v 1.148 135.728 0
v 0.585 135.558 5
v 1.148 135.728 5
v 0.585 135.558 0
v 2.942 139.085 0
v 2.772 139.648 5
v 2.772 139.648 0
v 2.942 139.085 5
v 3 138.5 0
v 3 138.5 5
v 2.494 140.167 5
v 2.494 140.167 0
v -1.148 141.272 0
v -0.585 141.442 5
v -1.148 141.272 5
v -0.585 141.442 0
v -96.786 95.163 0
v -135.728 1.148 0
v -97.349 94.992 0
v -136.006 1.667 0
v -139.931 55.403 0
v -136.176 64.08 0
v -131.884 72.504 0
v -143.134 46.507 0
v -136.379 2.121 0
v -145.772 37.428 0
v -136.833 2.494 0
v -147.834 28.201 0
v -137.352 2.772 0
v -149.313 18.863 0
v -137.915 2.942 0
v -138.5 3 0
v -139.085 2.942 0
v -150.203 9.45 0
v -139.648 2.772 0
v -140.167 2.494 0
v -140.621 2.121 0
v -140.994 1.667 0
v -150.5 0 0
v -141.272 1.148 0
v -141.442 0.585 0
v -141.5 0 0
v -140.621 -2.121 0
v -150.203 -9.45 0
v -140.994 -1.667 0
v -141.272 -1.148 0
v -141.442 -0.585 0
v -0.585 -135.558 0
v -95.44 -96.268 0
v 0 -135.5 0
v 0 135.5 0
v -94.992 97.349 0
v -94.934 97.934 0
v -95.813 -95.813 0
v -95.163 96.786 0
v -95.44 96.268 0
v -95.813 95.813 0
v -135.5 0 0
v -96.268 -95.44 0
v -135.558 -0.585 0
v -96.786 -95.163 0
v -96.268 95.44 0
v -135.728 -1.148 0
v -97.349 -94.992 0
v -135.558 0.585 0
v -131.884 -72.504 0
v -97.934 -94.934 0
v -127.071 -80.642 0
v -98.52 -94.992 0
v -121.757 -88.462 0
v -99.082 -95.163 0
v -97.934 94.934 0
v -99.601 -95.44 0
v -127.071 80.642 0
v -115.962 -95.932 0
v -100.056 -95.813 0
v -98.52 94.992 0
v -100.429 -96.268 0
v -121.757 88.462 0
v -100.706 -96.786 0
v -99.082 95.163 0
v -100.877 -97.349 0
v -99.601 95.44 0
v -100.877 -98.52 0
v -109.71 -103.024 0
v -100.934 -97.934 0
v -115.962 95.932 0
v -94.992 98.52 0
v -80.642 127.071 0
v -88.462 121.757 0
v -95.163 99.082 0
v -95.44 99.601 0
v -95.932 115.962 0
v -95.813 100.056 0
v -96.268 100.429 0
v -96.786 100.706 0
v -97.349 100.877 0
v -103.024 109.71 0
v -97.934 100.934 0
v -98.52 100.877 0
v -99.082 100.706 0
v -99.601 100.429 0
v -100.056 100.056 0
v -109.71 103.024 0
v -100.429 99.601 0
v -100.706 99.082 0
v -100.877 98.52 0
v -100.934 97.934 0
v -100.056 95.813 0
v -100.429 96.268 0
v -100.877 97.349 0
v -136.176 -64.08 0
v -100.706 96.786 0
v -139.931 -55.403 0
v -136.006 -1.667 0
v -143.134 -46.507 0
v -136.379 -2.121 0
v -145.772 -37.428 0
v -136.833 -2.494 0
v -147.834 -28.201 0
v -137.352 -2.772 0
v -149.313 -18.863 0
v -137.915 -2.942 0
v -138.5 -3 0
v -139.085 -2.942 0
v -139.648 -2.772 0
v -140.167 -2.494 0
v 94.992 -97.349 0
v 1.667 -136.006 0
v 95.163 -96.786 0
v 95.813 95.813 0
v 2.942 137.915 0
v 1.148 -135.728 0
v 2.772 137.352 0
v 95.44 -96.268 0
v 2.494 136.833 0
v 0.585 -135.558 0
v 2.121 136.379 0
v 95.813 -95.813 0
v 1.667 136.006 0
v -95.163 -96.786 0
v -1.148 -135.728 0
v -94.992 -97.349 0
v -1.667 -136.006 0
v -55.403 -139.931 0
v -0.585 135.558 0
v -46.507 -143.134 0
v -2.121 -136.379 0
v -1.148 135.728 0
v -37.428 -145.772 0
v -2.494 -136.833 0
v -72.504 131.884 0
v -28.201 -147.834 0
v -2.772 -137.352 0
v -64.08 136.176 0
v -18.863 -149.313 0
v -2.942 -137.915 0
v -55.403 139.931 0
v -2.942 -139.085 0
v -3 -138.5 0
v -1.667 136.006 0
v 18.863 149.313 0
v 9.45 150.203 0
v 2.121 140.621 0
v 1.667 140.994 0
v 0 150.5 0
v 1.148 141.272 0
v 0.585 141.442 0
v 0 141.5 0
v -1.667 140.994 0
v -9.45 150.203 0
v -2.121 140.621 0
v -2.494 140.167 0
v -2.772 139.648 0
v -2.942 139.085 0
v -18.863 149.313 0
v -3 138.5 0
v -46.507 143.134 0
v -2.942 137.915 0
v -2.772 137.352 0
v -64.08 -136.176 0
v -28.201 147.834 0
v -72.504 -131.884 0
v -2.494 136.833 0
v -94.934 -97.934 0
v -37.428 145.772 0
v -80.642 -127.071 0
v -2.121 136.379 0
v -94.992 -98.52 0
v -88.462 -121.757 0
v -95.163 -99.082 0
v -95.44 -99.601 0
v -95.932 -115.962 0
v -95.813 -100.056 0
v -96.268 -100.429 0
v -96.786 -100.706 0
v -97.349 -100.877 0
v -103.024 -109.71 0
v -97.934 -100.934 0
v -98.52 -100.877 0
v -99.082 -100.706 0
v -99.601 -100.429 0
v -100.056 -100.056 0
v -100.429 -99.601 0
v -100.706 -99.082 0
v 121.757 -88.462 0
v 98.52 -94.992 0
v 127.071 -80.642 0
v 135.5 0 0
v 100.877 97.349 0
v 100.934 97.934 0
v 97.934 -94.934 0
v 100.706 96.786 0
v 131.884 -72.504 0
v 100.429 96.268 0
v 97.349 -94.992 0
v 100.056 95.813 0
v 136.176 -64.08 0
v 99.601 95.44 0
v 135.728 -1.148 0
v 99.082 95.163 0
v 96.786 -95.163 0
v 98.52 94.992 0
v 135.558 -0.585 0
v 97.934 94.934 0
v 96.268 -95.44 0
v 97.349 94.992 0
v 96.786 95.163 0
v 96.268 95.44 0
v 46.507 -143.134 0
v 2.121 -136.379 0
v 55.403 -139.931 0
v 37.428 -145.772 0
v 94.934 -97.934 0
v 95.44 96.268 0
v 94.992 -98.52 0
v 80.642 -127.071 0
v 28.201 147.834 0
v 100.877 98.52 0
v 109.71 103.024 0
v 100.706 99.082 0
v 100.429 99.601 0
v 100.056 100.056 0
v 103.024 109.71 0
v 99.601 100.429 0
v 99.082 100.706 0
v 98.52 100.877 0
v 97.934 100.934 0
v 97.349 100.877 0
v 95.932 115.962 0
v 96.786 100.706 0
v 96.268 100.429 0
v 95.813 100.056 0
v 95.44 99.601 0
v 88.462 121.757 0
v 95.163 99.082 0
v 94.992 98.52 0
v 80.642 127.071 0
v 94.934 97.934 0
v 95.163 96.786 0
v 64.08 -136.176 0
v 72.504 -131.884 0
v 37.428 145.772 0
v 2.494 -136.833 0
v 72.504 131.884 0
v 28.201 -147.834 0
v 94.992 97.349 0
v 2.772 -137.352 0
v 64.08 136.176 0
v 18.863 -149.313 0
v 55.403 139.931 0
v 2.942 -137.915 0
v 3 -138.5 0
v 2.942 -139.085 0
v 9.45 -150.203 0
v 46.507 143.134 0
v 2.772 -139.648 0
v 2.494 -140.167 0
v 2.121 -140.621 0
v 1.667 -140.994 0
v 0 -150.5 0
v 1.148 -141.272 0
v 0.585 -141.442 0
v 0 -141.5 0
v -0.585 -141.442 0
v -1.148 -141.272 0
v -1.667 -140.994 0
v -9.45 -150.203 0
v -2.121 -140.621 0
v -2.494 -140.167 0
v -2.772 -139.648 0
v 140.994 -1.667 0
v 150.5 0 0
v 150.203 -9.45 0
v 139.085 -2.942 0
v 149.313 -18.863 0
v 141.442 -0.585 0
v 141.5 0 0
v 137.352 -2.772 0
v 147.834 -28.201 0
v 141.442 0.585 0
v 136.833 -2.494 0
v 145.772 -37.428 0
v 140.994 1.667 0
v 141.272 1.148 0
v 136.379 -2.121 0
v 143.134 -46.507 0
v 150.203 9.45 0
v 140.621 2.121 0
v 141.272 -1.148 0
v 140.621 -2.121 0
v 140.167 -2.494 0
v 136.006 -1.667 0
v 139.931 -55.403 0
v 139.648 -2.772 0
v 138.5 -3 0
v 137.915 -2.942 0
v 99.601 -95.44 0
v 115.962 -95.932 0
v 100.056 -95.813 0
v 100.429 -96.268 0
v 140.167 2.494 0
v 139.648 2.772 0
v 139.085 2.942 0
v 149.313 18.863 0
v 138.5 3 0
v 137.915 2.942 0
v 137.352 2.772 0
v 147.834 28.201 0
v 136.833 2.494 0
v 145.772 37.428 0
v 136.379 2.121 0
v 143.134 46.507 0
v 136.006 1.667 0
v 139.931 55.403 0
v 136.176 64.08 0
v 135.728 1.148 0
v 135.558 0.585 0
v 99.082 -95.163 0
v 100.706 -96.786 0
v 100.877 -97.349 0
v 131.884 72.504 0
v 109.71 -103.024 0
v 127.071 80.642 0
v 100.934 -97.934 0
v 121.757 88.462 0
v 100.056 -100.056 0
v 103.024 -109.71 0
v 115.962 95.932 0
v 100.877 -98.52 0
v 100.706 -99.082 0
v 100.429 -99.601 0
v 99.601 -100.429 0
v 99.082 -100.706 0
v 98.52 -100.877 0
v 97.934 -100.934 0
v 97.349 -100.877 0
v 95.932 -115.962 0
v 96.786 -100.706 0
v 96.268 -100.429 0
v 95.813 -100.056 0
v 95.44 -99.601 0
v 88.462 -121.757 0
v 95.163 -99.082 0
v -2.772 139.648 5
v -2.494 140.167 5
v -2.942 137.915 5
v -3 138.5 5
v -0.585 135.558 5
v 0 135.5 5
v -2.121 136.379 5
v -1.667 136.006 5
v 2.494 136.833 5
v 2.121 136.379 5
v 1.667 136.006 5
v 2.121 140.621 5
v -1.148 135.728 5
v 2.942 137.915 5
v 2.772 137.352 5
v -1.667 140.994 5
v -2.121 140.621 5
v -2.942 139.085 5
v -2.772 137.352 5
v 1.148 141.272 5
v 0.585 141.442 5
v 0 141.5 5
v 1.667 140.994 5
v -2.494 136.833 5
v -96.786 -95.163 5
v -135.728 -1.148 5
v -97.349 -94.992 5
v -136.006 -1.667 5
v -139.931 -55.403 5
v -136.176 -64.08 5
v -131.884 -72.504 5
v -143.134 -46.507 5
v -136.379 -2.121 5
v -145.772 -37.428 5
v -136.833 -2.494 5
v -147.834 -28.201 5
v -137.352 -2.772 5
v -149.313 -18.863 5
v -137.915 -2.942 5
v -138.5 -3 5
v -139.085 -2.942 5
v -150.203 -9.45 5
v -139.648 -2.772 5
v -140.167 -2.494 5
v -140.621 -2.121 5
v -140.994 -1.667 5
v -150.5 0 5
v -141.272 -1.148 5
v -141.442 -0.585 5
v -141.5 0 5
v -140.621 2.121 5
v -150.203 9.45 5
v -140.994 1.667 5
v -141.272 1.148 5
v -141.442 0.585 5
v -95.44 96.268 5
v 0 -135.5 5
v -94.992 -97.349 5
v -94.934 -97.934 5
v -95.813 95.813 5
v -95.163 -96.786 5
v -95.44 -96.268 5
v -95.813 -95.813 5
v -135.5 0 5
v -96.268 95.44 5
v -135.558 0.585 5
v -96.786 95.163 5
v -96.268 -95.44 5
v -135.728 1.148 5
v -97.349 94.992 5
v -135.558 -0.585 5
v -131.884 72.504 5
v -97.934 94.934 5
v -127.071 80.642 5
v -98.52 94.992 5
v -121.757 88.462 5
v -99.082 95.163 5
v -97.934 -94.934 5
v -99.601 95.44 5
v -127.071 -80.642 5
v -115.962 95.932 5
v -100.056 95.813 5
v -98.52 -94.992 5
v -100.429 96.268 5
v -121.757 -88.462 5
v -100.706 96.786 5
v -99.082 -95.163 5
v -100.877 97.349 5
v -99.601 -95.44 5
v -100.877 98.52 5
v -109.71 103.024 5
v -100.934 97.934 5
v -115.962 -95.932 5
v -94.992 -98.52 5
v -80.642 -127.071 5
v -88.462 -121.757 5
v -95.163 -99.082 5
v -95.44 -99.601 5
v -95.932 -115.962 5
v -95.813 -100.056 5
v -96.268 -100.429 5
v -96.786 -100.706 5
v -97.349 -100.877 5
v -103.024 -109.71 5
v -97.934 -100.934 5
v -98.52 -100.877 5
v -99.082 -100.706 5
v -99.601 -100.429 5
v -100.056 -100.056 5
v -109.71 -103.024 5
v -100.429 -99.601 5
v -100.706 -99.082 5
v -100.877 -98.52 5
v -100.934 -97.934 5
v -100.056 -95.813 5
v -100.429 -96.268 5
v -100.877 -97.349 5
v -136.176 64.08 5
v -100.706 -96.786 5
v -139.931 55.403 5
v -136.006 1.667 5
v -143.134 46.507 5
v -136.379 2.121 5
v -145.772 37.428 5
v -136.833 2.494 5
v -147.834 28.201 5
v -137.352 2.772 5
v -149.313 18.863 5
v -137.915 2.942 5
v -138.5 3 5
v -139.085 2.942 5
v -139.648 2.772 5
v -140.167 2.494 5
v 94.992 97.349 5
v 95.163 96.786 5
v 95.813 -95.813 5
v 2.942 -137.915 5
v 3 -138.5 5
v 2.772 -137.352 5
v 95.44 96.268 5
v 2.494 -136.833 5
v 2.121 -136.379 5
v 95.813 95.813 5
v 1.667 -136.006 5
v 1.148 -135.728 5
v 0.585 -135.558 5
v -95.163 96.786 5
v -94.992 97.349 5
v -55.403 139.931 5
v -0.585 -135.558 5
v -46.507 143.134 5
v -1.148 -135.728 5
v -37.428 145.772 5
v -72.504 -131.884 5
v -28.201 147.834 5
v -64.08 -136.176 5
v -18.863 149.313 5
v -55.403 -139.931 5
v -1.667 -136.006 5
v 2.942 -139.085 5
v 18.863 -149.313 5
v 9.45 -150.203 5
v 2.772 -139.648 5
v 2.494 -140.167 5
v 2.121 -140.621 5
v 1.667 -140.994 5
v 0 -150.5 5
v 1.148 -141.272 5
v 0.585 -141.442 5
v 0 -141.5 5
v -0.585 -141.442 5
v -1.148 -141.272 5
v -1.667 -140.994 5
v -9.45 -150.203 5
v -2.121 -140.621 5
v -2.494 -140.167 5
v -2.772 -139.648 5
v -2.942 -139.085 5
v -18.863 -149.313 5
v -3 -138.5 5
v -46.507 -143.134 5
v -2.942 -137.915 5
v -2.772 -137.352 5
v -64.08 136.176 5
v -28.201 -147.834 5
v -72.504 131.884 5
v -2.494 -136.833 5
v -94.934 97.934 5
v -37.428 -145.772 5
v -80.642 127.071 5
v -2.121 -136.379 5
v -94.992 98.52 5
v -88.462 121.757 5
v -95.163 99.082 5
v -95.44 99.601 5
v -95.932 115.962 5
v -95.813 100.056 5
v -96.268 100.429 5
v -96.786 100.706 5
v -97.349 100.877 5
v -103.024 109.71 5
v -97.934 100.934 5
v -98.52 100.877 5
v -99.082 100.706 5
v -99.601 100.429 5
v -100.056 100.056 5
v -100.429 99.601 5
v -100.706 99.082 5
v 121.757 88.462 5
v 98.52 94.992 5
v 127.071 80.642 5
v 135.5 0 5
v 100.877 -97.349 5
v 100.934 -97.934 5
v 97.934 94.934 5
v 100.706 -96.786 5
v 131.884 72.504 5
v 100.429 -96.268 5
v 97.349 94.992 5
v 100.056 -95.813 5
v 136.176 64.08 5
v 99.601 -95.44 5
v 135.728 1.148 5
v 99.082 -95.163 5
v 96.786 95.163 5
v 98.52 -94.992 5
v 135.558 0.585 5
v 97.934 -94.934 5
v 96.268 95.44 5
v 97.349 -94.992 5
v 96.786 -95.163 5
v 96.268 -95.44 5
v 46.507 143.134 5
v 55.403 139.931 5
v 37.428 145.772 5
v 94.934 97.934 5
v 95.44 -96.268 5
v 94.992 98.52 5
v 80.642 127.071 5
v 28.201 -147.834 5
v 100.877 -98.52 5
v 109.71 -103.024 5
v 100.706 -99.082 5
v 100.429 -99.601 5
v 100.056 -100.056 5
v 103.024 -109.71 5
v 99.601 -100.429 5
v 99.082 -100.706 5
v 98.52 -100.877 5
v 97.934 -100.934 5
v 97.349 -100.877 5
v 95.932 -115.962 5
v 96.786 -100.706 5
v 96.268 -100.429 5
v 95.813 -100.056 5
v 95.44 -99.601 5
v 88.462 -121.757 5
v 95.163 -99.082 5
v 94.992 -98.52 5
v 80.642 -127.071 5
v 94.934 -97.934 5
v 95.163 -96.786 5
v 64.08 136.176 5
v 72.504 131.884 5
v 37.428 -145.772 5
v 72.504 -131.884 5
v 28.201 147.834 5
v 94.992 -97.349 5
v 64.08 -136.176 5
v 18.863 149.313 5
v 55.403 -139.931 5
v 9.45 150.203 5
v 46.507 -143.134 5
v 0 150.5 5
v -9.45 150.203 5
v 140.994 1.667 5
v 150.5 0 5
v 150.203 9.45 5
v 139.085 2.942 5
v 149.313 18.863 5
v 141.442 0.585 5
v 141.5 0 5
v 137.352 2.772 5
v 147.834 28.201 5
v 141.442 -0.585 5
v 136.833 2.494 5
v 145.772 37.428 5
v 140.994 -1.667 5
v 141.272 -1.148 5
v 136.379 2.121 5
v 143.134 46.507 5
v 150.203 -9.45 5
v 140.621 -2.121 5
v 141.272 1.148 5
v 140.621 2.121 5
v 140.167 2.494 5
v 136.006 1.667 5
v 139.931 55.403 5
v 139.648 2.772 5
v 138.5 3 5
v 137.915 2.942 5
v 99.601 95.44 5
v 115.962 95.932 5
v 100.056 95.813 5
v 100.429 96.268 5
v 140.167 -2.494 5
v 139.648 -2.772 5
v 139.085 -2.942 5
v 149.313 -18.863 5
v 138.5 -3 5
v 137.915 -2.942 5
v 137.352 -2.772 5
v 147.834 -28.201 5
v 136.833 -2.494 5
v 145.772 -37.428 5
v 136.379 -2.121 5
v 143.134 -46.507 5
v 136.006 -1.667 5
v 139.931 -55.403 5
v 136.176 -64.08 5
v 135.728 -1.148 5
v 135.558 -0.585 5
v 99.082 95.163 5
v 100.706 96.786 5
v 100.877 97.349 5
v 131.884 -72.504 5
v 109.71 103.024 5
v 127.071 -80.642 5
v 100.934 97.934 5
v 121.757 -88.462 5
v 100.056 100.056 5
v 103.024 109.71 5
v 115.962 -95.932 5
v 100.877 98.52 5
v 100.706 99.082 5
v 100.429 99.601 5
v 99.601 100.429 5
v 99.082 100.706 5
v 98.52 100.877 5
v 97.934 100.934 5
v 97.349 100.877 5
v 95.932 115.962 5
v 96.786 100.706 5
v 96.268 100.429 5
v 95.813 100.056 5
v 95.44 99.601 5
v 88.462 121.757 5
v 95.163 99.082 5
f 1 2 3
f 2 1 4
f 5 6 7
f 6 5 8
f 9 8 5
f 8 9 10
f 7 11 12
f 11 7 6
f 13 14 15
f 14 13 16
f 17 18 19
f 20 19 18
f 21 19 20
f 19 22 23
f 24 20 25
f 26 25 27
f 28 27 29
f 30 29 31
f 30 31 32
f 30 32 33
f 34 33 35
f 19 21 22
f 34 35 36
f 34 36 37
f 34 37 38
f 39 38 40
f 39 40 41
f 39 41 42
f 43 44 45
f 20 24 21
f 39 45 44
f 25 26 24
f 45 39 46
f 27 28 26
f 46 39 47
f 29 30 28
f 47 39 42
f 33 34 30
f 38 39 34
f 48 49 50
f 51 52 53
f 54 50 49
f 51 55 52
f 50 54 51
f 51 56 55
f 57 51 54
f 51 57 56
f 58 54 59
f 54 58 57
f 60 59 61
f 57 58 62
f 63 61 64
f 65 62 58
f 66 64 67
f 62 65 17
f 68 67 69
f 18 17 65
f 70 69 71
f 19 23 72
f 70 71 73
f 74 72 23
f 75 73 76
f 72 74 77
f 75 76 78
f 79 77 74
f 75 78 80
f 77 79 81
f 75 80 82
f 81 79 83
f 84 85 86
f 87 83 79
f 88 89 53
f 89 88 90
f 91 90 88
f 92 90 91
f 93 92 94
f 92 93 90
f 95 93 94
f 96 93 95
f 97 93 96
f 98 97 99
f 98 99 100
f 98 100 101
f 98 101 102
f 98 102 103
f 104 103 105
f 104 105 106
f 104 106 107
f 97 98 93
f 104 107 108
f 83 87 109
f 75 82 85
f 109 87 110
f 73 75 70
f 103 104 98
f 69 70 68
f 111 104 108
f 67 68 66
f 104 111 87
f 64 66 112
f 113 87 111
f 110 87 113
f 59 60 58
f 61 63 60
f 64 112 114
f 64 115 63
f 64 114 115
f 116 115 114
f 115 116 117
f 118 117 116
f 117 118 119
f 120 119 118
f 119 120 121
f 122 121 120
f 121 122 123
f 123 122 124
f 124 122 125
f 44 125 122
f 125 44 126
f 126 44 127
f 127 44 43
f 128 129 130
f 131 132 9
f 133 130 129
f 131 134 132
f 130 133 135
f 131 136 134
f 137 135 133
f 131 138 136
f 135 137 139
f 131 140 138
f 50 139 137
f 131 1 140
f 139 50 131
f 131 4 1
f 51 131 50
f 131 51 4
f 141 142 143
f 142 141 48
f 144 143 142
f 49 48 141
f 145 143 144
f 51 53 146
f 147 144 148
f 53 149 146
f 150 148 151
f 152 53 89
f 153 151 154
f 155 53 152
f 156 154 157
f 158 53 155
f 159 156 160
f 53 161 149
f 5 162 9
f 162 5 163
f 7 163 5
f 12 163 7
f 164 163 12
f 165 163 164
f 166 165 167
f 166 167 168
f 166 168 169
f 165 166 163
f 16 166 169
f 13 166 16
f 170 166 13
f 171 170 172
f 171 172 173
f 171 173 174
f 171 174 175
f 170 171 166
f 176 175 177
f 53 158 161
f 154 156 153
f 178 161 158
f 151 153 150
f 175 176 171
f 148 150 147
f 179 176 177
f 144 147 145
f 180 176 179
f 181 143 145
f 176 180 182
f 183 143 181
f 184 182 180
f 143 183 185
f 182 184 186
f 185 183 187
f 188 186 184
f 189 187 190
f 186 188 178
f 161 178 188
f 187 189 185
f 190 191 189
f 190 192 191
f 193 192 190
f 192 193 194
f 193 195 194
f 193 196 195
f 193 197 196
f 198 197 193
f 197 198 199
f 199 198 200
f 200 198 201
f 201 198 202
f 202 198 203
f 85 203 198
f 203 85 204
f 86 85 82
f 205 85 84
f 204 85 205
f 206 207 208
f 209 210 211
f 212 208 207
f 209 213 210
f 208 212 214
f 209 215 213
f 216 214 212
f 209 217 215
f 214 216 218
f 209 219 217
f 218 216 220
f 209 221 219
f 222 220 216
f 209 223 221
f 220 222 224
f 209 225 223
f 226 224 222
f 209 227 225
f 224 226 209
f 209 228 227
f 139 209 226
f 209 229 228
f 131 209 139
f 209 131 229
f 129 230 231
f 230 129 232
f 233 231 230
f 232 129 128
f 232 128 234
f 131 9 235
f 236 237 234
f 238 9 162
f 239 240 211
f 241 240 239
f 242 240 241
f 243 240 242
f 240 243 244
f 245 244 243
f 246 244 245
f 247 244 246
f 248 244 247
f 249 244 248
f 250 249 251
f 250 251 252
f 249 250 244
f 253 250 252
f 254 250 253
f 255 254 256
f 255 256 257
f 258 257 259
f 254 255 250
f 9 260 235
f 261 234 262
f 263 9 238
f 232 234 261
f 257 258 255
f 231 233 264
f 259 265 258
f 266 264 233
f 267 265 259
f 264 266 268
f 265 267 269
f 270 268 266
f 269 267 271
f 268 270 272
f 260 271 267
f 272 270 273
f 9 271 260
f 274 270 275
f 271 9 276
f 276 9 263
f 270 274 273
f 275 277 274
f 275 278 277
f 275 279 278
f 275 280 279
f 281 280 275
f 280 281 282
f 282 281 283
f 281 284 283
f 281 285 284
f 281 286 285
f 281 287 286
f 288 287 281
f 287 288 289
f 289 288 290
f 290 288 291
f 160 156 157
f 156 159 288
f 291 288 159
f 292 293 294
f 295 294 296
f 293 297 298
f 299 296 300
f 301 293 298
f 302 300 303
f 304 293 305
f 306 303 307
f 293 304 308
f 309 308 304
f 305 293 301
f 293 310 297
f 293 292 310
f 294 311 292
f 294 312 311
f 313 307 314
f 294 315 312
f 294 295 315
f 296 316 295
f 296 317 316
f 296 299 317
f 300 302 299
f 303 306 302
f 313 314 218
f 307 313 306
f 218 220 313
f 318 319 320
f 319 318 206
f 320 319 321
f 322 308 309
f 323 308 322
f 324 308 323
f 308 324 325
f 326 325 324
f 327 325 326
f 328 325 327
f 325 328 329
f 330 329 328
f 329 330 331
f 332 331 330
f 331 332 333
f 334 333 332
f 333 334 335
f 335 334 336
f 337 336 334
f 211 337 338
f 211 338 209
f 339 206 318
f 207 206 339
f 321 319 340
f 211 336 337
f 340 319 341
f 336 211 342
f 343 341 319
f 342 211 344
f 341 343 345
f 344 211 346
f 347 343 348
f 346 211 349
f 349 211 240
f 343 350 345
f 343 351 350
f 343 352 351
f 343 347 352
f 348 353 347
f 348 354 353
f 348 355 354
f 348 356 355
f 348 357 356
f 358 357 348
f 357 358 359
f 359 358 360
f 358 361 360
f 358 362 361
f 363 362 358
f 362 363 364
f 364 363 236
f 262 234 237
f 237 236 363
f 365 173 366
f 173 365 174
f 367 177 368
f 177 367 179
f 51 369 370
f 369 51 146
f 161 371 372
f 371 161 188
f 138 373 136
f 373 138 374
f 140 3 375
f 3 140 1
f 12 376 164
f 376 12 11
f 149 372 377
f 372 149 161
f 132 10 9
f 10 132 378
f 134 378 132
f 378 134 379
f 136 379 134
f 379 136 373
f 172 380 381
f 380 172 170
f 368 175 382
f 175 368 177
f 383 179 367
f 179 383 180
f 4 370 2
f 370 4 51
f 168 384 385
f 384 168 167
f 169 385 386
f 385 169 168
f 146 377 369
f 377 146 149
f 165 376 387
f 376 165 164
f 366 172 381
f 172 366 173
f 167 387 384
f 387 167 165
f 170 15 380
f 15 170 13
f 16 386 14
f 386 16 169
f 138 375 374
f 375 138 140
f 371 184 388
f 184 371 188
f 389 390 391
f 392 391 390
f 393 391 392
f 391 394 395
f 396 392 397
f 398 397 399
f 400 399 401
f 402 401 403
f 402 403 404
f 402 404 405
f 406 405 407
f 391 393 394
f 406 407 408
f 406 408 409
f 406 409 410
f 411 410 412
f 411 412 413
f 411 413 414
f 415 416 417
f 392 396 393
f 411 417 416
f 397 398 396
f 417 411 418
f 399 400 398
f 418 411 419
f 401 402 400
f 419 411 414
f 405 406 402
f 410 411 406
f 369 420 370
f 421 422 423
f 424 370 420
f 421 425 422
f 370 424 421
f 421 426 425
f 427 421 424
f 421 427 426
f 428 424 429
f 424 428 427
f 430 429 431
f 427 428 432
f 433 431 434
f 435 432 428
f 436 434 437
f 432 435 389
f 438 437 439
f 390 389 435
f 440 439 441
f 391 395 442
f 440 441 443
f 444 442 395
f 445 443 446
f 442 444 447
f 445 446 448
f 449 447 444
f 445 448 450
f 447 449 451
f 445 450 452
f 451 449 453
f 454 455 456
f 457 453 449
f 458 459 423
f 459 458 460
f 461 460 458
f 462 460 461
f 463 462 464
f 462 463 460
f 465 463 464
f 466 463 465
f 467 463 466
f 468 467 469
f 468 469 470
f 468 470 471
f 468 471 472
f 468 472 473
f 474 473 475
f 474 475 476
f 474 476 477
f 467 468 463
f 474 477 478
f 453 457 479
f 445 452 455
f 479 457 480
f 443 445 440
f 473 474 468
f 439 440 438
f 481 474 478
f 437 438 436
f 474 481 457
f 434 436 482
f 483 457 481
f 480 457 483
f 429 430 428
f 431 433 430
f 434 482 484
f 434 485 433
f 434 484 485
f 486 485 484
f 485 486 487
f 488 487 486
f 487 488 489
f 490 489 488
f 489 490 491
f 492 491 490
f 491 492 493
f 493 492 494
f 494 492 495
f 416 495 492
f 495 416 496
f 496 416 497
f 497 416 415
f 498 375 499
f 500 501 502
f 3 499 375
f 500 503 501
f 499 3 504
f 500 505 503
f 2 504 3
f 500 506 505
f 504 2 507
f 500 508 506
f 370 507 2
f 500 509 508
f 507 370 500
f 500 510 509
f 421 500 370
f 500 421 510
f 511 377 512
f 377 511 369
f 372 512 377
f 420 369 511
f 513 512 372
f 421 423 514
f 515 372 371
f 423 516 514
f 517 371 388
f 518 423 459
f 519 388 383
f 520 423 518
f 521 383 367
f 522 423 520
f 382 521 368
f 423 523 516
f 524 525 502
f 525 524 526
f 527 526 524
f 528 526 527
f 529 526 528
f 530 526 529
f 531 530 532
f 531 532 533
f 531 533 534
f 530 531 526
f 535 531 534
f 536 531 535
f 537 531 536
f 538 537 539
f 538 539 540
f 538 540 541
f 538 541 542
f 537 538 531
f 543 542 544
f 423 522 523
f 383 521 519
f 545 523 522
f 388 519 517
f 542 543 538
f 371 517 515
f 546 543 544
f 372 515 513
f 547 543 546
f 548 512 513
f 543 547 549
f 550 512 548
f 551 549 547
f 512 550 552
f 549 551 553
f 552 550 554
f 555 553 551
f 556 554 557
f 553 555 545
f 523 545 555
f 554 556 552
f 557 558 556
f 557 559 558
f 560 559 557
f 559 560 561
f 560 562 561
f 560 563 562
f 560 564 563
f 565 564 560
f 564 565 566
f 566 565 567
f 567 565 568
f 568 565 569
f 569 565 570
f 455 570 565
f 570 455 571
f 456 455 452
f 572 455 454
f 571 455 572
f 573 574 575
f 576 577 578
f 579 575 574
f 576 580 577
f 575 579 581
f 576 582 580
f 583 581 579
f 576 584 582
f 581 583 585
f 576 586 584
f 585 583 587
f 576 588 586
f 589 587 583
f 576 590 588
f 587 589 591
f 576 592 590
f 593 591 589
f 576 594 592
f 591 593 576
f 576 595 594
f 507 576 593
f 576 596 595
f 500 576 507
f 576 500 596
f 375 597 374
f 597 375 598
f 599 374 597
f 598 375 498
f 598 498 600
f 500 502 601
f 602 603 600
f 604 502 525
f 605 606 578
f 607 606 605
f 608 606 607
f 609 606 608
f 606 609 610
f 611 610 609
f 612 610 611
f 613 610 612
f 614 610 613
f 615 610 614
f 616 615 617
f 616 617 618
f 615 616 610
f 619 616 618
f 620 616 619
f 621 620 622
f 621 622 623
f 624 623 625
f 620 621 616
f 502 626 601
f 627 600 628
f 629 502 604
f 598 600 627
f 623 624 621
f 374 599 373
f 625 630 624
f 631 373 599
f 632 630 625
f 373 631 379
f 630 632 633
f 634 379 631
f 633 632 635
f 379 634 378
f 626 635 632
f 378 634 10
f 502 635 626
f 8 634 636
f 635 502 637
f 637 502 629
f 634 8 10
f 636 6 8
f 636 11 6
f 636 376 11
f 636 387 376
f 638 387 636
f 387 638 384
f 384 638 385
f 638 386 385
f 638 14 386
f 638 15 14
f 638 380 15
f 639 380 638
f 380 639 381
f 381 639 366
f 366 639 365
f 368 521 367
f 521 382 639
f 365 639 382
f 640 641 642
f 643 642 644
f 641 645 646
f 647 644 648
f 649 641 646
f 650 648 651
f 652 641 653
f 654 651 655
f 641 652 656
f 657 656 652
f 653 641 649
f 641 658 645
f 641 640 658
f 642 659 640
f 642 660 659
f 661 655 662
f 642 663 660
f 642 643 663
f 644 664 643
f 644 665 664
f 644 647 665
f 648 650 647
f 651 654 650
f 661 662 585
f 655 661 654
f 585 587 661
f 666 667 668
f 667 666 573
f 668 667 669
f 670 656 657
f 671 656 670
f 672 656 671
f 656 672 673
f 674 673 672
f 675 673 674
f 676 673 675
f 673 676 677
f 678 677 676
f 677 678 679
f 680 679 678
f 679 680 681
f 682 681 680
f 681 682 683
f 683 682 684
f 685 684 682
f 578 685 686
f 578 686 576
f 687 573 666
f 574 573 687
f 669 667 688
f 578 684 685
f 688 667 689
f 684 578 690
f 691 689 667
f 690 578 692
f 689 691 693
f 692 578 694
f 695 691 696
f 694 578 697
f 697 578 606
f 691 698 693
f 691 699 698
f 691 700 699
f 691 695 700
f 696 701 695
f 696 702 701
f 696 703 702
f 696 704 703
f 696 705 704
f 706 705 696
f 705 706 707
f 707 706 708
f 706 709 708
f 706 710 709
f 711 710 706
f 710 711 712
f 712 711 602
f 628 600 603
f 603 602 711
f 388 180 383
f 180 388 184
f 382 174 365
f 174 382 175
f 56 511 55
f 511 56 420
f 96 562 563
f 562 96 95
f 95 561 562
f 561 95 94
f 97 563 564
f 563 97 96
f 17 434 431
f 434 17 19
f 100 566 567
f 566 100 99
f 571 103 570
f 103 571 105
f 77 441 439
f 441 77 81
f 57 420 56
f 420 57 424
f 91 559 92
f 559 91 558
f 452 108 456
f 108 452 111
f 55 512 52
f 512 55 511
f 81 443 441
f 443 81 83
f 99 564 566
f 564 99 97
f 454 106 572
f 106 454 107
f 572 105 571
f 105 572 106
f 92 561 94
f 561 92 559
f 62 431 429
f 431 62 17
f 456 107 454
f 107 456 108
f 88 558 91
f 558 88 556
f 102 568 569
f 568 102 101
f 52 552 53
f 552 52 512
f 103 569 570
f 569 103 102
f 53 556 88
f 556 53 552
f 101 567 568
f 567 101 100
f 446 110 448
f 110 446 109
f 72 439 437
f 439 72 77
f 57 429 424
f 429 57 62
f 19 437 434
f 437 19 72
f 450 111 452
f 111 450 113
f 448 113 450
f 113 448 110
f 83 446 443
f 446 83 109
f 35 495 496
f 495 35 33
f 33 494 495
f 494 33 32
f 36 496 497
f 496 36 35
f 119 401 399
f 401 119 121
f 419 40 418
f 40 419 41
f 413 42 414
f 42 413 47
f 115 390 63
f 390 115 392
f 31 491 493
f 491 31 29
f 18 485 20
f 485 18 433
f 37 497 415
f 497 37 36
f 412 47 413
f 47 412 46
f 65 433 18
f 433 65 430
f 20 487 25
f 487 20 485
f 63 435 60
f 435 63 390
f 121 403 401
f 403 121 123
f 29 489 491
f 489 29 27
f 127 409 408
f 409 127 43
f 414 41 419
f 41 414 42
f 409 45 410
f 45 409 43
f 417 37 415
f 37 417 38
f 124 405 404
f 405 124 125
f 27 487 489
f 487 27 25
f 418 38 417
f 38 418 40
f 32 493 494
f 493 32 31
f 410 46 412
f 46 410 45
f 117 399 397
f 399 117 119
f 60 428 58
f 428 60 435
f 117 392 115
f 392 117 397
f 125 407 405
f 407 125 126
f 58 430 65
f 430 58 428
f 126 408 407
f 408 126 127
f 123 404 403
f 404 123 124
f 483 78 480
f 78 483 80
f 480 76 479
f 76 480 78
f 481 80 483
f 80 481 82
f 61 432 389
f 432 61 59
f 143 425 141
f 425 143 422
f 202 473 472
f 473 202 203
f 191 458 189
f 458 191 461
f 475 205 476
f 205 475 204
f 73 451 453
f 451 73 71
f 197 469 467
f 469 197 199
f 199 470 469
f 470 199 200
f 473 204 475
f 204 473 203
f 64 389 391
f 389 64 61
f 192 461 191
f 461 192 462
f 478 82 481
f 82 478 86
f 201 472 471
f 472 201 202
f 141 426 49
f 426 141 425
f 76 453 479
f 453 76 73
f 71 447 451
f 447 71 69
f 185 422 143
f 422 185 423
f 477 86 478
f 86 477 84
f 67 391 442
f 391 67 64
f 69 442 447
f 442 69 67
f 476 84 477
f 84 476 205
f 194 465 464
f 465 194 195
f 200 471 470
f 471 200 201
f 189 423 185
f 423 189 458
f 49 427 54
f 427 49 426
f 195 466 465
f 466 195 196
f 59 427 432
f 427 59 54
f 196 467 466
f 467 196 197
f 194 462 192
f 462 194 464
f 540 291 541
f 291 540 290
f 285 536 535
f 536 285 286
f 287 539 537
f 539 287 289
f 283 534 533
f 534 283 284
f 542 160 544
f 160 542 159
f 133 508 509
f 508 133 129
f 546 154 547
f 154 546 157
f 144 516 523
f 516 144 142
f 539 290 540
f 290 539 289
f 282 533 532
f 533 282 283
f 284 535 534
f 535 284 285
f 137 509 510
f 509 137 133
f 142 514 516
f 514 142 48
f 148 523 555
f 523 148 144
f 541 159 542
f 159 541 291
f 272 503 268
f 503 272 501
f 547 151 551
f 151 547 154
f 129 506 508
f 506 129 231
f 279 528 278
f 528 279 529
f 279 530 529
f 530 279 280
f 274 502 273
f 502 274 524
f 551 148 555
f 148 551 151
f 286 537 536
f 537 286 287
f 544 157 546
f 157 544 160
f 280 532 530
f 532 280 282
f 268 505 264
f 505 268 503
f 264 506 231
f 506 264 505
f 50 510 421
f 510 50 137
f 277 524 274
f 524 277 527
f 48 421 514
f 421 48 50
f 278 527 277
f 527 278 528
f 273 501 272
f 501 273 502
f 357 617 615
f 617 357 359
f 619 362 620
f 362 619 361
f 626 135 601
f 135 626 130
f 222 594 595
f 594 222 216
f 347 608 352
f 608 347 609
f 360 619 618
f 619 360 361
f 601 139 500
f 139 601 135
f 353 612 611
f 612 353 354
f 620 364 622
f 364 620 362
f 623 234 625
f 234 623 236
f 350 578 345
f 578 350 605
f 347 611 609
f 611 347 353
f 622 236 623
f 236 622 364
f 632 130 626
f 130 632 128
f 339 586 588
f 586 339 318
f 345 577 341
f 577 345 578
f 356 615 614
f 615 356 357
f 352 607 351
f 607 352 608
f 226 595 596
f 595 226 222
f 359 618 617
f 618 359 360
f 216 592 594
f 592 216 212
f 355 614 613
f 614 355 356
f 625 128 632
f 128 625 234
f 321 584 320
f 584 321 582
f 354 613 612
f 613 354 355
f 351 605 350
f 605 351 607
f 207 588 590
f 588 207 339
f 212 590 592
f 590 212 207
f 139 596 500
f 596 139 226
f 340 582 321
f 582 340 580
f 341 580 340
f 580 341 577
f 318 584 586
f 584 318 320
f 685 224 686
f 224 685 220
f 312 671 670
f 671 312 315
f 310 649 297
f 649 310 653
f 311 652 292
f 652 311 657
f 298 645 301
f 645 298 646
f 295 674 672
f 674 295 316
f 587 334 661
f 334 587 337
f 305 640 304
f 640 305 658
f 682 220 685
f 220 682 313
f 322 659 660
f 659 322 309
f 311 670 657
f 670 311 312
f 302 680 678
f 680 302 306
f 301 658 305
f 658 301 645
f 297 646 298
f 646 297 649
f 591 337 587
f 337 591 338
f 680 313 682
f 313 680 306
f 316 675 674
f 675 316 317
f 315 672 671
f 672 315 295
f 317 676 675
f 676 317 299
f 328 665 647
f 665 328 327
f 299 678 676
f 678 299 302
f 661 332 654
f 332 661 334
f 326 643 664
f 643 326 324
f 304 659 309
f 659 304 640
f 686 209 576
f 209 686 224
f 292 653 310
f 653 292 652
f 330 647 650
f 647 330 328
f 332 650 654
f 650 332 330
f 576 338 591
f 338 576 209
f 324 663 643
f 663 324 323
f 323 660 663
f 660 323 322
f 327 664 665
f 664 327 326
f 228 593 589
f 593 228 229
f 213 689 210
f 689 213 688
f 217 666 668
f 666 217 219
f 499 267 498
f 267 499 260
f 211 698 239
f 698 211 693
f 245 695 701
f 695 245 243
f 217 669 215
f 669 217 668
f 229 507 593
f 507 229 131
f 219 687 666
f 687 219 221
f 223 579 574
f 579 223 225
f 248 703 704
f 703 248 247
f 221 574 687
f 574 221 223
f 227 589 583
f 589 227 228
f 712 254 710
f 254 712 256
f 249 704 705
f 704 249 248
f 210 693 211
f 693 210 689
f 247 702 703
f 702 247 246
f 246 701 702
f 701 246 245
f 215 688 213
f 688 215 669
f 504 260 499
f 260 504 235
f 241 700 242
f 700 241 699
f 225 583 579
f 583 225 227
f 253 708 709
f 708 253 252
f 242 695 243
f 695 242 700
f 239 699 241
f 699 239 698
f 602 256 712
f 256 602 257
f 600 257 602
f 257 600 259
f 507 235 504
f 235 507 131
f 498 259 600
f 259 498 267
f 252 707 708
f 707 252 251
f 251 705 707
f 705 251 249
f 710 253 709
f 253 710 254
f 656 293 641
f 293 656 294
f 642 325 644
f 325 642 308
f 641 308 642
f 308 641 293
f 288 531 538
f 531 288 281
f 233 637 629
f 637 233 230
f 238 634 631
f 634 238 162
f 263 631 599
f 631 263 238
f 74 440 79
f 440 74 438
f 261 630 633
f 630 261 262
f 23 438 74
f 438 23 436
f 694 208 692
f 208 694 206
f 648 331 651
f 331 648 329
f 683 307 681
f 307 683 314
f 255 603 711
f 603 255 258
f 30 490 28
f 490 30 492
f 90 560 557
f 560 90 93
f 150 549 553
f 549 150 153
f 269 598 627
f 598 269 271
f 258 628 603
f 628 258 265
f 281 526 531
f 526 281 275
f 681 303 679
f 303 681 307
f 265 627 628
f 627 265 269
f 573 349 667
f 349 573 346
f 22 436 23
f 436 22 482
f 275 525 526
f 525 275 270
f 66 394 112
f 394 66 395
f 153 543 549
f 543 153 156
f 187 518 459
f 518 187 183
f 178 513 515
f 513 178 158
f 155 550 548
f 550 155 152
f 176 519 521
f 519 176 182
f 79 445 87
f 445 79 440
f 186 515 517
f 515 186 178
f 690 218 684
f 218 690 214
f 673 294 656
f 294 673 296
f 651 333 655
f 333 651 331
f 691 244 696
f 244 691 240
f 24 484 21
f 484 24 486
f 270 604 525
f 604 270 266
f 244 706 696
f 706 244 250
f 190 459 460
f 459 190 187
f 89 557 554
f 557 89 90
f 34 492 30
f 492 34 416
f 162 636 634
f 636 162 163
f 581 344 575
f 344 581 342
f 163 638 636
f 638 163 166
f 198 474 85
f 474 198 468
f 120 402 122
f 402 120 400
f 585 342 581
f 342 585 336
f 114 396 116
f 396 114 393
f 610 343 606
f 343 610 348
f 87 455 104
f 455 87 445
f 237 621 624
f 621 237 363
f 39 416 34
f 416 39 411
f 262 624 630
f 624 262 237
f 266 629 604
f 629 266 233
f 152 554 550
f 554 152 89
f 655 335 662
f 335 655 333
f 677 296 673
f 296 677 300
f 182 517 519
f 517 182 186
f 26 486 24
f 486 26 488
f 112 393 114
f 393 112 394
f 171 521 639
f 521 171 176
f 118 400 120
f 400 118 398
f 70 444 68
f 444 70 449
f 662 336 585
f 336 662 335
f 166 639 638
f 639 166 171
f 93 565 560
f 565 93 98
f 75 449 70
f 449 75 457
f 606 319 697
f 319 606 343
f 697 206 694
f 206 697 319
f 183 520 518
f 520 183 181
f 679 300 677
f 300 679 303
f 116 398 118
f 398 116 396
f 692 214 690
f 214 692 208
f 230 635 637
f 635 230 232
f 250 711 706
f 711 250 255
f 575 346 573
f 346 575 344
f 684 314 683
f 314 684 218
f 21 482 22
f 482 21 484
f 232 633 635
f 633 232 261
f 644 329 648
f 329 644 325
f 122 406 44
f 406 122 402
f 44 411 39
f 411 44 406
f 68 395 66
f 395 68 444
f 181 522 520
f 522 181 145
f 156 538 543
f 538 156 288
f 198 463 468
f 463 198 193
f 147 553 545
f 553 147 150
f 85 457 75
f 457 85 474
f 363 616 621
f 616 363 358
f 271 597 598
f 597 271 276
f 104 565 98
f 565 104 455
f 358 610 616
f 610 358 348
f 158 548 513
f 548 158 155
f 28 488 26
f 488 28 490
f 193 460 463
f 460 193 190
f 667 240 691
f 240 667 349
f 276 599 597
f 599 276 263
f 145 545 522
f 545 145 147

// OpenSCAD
dia = 301;
dia_skrue = 6;
skrue_rim_dist = 12;
h = 5;
bugdrit = $preview ? .1 : 0;

echo(str("bugdrit = ", bugdrit));
difference() {
    cylinder(h=h, d=dia, $fn = 100);
    for (theta = [ 0 : 45 : 315 ]) {
        echo(str("Rotér ", theta, " grader og lag et høl"));
        rotate([0,0,theta]) {
            translate([0,dia/2-skrue_rim_dist,-bugdrit]) {
                cylinder(h=h+bugdrit*2, d=dia_skrue, $fn = 32);
            }
        }
    }
}
